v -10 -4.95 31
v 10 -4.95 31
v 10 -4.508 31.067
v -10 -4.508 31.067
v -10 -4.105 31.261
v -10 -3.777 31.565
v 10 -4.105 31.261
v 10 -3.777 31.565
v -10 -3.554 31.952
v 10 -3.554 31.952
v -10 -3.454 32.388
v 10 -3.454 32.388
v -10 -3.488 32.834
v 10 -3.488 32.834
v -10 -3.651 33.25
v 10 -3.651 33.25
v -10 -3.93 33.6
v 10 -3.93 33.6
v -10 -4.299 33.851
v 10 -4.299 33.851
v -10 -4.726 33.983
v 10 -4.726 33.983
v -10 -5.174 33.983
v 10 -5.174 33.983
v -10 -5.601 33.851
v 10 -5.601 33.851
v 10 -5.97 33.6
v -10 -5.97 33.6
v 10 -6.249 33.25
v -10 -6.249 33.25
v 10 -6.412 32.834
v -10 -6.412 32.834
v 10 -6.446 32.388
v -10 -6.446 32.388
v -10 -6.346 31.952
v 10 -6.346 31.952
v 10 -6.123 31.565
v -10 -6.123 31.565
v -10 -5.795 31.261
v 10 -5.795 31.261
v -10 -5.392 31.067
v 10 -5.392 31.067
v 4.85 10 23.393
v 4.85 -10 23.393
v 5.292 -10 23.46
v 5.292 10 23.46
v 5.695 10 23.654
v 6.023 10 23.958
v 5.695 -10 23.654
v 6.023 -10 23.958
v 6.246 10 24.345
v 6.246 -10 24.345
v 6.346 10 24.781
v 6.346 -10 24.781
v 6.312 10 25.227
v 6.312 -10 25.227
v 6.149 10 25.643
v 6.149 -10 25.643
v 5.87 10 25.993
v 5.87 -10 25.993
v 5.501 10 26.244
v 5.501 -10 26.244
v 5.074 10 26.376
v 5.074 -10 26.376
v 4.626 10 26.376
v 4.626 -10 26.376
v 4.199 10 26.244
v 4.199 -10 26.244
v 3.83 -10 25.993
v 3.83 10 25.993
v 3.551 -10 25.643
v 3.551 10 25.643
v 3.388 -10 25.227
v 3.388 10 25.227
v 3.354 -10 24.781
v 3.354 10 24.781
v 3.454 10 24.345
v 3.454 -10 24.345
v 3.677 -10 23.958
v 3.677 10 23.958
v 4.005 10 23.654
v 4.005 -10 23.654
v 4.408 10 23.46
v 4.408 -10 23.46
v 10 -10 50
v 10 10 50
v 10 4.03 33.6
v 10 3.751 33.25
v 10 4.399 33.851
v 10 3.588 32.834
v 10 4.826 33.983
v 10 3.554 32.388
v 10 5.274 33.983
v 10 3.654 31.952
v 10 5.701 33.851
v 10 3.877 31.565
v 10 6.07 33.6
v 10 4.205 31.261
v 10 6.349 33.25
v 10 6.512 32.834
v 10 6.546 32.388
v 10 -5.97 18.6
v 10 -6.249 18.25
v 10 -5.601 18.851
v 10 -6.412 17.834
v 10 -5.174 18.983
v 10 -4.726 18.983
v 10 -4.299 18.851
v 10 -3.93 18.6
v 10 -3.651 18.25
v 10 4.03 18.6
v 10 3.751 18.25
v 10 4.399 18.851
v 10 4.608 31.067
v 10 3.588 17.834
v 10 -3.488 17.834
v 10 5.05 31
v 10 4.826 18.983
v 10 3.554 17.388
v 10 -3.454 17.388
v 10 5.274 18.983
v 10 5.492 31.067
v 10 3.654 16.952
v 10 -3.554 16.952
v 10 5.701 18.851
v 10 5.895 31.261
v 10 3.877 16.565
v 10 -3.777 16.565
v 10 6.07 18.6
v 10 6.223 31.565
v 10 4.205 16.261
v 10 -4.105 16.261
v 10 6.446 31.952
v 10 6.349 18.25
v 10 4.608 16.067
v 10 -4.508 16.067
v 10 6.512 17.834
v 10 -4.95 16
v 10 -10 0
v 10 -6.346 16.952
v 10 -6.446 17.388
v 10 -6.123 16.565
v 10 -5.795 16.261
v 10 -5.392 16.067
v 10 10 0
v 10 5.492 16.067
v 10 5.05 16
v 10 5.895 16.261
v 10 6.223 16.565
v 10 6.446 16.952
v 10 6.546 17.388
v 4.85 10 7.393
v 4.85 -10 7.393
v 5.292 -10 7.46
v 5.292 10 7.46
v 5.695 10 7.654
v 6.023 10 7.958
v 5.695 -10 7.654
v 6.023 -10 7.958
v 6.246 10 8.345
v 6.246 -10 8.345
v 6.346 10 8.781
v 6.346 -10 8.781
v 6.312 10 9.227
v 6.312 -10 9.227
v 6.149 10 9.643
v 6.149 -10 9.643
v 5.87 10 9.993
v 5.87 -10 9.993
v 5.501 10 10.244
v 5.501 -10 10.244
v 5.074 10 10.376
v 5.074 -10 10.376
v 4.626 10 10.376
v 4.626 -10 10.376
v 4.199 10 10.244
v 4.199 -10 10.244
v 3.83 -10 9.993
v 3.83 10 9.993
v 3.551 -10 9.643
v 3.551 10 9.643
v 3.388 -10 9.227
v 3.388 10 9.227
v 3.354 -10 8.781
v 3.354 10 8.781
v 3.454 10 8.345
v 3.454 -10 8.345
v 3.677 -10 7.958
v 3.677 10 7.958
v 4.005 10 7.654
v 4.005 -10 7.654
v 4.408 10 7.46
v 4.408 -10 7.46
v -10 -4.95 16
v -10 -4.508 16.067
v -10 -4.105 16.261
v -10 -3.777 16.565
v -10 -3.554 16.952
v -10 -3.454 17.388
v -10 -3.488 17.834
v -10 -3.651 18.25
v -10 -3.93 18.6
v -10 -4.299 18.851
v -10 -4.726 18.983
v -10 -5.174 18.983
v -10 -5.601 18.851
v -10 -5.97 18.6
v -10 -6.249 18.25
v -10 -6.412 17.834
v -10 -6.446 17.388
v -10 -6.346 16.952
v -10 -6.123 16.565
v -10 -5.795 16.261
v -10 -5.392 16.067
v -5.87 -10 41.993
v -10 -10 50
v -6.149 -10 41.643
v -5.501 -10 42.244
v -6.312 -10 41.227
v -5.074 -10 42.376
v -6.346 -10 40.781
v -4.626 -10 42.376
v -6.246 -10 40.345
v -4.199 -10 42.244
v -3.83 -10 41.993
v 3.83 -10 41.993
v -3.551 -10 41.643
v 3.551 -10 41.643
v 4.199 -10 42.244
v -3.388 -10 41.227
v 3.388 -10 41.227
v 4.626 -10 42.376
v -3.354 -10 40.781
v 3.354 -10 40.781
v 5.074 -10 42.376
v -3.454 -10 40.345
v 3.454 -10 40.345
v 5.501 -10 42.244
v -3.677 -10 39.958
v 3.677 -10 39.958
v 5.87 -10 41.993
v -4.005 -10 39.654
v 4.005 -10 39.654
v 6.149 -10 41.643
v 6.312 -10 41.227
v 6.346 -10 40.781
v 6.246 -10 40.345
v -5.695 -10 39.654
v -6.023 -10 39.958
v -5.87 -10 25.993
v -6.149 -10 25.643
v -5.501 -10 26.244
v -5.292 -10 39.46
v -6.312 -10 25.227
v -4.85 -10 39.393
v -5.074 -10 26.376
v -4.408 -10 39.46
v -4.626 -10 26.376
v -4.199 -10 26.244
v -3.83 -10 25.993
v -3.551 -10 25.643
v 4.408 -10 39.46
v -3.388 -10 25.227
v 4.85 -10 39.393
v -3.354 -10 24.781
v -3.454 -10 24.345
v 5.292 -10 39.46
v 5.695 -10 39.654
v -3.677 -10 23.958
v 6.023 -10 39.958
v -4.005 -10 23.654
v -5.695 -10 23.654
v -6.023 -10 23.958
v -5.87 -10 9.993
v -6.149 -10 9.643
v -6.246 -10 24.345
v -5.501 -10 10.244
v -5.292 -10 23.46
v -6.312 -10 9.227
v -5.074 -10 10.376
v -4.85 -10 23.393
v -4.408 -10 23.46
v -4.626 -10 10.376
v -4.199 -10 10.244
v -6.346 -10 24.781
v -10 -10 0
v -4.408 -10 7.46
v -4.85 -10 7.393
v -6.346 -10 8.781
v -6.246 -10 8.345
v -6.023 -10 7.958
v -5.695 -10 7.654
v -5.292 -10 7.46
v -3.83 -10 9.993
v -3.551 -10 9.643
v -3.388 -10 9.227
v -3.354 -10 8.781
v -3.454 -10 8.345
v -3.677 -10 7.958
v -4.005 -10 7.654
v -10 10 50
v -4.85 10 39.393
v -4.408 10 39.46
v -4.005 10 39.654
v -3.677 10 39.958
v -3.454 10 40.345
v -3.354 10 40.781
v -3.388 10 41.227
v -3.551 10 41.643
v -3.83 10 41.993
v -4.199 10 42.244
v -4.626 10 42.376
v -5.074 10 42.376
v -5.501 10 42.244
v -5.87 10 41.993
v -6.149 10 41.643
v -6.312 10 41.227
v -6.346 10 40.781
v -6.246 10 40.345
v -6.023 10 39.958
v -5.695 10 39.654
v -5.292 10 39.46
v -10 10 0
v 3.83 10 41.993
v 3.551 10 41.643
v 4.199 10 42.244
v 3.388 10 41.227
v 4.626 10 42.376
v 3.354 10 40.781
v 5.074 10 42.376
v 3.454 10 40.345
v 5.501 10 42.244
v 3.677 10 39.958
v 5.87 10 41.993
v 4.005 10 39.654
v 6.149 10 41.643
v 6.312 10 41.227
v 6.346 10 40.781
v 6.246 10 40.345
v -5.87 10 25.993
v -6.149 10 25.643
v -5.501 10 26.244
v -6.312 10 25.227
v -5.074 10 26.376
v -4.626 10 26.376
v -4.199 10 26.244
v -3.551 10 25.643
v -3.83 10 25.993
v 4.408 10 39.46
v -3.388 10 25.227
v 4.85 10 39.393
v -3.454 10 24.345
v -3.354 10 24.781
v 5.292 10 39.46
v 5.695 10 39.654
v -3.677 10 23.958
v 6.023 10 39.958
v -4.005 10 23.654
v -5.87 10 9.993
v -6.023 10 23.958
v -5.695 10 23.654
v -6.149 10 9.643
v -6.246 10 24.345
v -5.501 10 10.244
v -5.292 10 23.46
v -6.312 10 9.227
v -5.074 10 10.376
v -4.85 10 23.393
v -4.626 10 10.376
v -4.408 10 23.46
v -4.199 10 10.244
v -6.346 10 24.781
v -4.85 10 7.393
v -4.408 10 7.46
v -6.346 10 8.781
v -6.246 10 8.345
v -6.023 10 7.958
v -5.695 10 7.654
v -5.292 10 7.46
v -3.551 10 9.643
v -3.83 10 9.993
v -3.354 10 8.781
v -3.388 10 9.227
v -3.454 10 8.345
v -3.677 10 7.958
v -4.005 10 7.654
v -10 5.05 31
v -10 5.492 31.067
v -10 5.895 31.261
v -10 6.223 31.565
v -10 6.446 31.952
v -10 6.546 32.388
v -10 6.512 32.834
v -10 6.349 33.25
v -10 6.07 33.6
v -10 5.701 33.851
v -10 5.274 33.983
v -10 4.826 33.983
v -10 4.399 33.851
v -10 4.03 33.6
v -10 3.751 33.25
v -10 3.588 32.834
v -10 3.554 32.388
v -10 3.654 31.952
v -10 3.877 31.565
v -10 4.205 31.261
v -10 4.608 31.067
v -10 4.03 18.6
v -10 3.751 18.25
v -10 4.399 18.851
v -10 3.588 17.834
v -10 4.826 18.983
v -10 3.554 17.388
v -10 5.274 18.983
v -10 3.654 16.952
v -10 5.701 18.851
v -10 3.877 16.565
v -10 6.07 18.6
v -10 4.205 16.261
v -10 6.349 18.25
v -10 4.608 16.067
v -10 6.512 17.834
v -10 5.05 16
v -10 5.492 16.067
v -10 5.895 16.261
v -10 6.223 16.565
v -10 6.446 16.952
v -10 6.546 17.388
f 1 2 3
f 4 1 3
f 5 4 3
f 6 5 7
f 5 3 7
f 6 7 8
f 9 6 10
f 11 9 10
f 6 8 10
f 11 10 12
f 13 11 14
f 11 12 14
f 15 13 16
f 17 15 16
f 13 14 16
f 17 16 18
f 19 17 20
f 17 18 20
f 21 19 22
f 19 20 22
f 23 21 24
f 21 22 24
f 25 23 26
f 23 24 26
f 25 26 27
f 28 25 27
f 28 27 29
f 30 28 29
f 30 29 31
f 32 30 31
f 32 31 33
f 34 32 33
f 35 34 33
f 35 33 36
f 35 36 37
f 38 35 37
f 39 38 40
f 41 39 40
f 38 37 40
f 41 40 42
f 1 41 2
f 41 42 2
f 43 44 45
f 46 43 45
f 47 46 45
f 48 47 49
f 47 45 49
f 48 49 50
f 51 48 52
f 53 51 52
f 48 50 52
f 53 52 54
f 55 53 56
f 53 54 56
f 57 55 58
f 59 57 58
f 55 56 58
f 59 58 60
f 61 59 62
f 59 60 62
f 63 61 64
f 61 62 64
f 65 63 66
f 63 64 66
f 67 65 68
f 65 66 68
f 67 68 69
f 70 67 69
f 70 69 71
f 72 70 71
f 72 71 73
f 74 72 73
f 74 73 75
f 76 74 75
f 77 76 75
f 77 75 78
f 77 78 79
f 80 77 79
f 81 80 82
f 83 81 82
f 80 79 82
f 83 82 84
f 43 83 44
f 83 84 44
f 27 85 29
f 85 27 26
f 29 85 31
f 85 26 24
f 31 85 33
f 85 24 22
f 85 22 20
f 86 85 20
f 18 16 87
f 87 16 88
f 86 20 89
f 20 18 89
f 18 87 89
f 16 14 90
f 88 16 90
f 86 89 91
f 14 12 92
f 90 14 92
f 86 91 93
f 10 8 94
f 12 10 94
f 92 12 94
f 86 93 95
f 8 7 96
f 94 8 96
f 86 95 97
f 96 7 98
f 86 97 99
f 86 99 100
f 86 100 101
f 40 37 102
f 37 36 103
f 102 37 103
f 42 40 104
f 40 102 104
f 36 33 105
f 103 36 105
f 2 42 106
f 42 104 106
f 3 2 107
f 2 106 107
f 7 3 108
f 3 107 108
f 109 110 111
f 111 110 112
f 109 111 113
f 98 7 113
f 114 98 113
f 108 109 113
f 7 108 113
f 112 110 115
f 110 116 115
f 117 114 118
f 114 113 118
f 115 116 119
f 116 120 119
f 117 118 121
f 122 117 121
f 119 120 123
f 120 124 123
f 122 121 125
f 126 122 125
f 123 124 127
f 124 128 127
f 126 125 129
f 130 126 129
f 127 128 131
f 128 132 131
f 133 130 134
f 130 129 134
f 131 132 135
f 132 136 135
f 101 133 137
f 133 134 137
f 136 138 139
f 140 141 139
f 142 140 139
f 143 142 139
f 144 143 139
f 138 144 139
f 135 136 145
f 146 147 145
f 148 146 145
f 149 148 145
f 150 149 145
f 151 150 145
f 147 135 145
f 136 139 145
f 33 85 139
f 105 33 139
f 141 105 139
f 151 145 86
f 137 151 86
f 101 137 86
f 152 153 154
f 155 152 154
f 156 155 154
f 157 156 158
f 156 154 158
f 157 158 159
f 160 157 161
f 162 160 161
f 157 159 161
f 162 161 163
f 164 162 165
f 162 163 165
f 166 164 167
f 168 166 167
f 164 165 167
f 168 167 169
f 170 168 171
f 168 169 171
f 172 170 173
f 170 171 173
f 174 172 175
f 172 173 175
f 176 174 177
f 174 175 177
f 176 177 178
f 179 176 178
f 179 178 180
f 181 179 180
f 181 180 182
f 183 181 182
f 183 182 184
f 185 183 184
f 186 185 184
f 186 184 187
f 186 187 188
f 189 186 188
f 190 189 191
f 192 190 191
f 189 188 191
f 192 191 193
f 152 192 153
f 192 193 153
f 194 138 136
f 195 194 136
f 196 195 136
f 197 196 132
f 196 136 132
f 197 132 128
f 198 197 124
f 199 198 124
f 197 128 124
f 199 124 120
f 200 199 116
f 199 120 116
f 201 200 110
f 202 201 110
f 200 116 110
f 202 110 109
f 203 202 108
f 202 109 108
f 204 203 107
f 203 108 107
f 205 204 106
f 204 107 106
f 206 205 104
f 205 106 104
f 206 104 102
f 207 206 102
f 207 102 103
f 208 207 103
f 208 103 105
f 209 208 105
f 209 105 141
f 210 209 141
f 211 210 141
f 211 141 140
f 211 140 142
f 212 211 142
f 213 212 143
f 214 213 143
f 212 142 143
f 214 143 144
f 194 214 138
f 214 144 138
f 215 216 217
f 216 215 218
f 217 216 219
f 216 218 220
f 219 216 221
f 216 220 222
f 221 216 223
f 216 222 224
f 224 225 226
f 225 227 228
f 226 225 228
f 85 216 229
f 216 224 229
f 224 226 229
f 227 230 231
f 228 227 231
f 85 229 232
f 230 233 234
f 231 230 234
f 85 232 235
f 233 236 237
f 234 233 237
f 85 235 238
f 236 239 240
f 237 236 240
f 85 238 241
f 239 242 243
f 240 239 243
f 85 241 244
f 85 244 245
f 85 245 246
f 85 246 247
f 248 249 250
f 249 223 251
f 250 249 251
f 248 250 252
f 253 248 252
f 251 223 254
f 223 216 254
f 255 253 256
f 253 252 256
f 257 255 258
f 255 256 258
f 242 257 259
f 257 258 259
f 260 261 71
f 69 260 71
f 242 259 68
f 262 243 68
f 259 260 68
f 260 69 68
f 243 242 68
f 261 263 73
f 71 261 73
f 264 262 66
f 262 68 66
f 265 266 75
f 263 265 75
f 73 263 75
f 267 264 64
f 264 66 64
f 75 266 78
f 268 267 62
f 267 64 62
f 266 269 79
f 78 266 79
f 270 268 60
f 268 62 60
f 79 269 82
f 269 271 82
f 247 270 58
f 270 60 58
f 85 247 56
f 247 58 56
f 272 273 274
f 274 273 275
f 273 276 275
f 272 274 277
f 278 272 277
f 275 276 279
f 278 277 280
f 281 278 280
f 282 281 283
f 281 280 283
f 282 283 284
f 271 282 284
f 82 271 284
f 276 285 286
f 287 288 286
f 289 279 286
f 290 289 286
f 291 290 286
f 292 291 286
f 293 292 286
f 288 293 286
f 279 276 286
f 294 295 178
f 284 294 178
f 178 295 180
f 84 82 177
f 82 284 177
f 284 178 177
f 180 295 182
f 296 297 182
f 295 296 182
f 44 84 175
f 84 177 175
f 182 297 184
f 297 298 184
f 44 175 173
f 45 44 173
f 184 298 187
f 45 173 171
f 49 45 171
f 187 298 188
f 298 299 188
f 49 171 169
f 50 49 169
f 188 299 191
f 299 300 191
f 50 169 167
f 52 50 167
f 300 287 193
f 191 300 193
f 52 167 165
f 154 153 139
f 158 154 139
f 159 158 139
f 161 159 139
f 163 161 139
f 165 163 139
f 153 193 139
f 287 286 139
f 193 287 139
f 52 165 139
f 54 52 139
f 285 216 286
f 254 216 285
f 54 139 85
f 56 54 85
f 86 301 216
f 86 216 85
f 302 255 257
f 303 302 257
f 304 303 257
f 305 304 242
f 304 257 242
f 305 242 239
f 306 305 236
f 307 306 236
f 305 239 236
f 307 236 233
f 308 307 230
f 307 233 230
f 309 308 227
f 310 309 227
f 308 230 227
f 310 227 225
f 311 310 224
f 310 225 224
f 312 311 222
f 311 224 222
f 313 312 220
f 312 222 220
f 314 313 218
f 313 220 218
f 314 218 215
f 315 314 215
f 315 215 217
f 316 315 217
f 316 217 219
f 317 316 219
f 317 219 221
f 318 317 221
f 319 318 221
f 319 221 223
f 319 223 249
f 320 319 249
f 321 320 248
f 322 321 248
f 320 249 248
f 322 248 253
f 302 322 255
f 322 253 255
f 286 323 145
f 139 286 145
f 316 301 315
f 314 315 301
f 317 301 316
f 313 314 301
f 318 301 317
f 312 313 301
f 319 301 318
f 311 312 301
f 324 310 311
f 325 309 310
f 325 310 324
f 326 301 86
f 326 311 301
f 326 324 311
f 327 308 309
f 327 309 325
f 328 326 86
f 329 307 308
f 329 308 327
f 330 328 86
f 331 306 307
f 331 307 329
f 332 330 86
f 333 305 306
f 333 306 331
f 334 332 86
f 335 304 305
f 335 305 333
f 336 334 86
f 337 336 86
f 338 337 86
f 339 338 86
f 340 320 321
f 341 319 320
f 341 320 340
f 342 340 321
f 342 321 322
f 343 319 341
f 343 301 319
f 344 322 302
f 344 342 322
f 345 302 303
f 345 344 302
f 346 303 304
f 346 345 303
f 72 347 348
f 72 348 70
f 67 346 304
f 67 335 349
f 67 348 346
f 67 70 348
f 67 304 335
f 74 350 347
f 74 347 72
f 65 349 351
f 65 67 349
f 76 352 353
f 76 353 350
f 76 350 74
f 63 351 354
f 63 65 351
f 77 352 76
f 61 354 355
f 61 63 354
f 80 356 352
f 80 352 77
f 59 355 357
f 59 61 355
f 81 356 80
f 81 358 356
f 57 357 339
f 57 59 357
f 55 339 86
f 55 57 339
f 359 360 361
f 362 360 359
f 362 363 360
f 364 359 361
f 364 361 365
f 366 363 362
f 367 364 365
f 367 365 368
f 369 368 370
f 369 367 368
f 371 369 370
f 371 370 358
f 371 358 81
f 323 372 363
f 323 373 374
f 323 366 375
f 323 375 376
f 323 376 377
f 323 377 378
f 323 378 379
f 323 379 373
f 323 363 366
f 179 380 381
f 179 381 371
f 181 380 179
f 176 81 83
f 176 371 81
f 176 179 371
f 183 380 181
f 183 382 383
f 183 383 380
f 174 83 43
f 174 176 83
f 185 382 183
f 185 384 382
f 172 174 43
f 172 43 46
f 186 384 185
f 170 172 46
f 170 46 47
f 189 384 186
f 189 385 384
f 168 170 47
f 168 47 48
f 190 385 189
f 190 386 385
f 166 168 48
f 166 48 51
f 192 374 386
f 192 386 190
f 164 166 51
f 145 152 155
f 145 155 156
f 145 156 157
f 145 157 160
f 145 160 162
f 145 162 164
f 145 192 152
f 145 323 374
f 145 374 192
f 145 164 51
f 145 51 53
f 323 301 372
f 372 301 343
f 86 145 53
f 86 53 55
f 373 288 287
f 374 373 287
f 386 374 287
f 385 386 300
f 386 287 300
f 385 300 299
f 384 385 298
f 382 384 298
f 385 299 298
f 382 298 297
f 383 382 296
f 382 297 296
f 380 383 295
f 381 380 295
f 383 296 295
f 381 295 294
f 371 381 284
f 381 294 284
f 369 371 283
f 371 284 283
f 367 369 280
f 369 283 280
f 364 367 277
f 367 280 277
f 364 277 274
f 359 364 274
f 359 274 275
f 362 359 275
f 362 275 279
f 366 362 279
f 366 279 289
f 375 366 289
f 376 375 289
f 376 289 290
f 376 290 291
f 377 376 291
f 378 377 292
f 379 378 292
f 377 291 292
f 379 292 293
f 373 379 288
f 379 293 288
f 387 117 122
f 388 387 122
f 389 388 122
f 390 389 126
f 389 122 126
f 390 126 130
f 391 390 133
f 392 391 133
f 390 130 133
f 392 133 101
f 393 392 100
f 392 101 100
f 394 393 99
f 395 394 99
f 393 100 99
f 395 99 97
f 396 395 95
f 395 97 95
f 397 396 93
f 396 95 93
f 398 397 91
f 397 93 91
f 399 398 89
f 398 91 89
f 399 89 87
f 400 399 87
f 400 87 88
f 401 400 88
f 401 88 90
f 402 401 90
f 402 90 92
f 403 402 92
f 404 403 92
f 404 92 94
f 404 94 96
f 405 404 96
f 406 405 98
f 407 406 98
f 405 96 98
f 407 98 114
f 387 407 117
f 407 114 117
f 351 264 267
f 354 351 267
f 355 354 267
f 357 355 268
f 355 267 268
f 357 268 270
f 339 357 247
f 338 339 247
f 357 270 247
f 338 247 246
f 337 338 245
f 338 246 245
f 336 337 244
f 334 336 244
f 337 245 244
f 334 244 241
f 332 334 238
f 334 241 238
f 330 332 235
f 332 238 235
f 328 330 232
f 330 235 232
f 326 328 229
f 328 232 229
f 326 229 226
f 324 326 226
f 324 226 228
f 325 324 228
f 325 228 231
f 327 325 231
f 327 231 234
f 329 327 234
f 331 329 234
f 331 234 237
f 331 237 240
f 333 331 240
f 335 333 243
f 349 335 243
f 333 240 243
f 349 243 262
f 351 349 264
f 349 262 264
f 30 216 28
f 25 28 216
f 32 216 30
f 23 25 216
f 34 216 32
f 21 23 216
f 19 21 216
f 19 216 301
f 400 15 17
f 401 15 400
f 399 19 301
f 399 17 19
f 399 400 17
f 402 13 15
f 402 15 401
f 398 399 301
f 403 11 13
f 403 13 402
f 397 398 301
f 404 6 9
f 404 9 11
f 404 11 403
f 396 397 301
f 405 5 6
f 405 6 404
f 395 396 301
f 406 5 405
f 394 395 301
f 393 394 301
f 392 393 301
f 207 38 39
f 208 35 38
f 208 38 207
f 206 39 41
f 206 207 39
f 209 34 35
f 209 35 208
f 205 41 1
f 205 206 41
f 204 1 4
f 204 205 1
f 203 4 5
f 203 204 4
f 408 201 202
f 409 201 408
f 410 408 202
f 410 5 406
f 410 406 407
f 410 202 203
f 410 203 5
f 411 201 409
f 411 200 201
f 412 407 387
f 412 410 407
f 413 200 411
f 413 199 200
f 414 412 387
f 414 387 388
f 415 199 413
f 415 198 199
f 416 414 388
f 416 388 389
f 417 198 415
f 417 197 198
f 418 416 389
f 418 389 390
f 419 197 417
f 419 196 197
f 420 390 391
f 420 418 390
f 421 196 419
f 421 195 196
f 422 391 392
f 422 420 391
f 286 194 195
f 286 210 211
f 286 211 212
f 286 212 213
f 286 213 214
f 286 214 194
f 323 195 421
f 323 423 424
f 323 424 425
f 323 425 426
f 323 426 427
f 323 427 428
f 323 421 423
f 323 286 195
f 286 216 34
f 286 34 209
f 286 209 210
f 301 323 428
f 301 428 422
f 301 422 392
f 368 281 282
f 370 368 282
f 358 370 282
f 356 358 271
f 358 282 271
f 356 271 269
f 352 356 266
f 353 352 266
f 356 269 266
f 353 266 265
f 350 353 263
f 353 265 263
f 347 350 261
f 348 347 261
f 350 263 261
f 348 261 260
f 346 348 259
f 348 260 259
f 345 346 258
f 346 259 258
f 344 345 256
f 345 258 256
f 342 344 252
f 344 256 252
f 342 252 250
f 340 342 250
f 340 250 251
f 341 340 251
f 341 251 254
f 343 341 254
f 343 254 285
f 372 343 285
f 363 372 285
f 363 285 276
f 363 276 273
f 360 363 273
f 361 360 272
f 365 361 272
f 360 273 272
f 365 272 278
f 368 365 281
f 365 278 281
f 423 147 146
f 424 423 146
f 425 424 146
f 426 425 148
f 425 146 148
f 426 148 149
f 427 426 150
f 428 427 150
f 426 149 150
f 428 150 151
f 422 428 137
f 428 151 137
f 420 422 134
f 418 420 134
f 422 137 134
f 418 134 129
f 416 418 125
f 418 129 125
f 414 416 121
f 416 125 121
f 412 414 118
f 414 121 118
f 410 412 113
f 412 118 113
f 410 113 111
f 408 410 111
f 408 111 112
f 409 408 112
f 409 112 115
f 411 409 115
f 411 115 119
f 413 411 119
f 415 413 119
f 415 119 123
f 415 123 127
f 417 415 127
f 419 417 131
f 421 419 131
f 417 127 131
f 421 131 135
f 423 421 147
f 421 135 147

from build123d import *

# Parameters (mm, degrees)
SKETCH_1_W          = 20
SKETCH_1_H          = 20
EXTRUDE_1_DEPTH     = 50
SKETCH_2_R          = 1.5
CUT_EXTRUDE_1_DEPTH = 20
SKETCH_4_R          = 1.5
CUT_EXTRUDE_3_DEPTH = 20


with BuildPart() as part:
    # 草图1 → 凸台-拉伸1 (new body)
    with BuildSketch(Plane.XY):
        Rectangle(SKETCH_1_W, SKETCH_1_H)
    extrude(amount=EXTRUDE_1_DEPTH)

    # 草图2 → 切除-拉伸1 (cut)
    with BuildSketch(Plane(origin=(10, 0, 0), x_dir=(0, 0, -1), z_dir=(1, 0, 0))):
        with Locations((-32.5, 5.05)):
            Circle(SKETCH_2_R)
        with Locations((-17.5, 5.05)):
            Circle(SKETCH_2_R)
        with Locations((-32.5, -4.95)):
            Circle(SKETCH_2_R)
        with Locations((-17.5, -4.95)):
            Circle(SKETCH_2_R)
    extrude(amount=-CUT_EXTRUDE_1_DEPTH, mode=Mode.SUBTRACT)

    # 草图4 → 切除-拉伸3 (cut)
    with BuildSketch(Plane.XZ.offset(10)):
        with Locations(Location((-4.85, 40.893026958, 0), (0, 0, 270))):
            Circle(SKETCH_4_R)
        with Locations(Location((-4.85, 24.893026958, 0), (0, 0, 270))):
            Circle(SKETCH_4_R)
        with Locations(Location((-4.85, 8.893026958, 0), (0, 0, 270))):
            Circle(SKETCH_4_R)
        with Locations(Location((4.85, 8.893026958, 0), (0, 0, 270))):
            Circle(SKETCH_4_R)
        with Locations(Location((4.85, 24.893026958, 0), (0, 0, 270))):
            Circle(SKETCH_4_R)
        with Locations(Location((4.85, 40.893026958, 0), (0, 0, 270))):
            Circle(SKETCH_4_R)
    extrude(amount=-CUT_EXTRUDE_3_DEPTH, mode=Mode.SUBTRACT)


solid = part.part
